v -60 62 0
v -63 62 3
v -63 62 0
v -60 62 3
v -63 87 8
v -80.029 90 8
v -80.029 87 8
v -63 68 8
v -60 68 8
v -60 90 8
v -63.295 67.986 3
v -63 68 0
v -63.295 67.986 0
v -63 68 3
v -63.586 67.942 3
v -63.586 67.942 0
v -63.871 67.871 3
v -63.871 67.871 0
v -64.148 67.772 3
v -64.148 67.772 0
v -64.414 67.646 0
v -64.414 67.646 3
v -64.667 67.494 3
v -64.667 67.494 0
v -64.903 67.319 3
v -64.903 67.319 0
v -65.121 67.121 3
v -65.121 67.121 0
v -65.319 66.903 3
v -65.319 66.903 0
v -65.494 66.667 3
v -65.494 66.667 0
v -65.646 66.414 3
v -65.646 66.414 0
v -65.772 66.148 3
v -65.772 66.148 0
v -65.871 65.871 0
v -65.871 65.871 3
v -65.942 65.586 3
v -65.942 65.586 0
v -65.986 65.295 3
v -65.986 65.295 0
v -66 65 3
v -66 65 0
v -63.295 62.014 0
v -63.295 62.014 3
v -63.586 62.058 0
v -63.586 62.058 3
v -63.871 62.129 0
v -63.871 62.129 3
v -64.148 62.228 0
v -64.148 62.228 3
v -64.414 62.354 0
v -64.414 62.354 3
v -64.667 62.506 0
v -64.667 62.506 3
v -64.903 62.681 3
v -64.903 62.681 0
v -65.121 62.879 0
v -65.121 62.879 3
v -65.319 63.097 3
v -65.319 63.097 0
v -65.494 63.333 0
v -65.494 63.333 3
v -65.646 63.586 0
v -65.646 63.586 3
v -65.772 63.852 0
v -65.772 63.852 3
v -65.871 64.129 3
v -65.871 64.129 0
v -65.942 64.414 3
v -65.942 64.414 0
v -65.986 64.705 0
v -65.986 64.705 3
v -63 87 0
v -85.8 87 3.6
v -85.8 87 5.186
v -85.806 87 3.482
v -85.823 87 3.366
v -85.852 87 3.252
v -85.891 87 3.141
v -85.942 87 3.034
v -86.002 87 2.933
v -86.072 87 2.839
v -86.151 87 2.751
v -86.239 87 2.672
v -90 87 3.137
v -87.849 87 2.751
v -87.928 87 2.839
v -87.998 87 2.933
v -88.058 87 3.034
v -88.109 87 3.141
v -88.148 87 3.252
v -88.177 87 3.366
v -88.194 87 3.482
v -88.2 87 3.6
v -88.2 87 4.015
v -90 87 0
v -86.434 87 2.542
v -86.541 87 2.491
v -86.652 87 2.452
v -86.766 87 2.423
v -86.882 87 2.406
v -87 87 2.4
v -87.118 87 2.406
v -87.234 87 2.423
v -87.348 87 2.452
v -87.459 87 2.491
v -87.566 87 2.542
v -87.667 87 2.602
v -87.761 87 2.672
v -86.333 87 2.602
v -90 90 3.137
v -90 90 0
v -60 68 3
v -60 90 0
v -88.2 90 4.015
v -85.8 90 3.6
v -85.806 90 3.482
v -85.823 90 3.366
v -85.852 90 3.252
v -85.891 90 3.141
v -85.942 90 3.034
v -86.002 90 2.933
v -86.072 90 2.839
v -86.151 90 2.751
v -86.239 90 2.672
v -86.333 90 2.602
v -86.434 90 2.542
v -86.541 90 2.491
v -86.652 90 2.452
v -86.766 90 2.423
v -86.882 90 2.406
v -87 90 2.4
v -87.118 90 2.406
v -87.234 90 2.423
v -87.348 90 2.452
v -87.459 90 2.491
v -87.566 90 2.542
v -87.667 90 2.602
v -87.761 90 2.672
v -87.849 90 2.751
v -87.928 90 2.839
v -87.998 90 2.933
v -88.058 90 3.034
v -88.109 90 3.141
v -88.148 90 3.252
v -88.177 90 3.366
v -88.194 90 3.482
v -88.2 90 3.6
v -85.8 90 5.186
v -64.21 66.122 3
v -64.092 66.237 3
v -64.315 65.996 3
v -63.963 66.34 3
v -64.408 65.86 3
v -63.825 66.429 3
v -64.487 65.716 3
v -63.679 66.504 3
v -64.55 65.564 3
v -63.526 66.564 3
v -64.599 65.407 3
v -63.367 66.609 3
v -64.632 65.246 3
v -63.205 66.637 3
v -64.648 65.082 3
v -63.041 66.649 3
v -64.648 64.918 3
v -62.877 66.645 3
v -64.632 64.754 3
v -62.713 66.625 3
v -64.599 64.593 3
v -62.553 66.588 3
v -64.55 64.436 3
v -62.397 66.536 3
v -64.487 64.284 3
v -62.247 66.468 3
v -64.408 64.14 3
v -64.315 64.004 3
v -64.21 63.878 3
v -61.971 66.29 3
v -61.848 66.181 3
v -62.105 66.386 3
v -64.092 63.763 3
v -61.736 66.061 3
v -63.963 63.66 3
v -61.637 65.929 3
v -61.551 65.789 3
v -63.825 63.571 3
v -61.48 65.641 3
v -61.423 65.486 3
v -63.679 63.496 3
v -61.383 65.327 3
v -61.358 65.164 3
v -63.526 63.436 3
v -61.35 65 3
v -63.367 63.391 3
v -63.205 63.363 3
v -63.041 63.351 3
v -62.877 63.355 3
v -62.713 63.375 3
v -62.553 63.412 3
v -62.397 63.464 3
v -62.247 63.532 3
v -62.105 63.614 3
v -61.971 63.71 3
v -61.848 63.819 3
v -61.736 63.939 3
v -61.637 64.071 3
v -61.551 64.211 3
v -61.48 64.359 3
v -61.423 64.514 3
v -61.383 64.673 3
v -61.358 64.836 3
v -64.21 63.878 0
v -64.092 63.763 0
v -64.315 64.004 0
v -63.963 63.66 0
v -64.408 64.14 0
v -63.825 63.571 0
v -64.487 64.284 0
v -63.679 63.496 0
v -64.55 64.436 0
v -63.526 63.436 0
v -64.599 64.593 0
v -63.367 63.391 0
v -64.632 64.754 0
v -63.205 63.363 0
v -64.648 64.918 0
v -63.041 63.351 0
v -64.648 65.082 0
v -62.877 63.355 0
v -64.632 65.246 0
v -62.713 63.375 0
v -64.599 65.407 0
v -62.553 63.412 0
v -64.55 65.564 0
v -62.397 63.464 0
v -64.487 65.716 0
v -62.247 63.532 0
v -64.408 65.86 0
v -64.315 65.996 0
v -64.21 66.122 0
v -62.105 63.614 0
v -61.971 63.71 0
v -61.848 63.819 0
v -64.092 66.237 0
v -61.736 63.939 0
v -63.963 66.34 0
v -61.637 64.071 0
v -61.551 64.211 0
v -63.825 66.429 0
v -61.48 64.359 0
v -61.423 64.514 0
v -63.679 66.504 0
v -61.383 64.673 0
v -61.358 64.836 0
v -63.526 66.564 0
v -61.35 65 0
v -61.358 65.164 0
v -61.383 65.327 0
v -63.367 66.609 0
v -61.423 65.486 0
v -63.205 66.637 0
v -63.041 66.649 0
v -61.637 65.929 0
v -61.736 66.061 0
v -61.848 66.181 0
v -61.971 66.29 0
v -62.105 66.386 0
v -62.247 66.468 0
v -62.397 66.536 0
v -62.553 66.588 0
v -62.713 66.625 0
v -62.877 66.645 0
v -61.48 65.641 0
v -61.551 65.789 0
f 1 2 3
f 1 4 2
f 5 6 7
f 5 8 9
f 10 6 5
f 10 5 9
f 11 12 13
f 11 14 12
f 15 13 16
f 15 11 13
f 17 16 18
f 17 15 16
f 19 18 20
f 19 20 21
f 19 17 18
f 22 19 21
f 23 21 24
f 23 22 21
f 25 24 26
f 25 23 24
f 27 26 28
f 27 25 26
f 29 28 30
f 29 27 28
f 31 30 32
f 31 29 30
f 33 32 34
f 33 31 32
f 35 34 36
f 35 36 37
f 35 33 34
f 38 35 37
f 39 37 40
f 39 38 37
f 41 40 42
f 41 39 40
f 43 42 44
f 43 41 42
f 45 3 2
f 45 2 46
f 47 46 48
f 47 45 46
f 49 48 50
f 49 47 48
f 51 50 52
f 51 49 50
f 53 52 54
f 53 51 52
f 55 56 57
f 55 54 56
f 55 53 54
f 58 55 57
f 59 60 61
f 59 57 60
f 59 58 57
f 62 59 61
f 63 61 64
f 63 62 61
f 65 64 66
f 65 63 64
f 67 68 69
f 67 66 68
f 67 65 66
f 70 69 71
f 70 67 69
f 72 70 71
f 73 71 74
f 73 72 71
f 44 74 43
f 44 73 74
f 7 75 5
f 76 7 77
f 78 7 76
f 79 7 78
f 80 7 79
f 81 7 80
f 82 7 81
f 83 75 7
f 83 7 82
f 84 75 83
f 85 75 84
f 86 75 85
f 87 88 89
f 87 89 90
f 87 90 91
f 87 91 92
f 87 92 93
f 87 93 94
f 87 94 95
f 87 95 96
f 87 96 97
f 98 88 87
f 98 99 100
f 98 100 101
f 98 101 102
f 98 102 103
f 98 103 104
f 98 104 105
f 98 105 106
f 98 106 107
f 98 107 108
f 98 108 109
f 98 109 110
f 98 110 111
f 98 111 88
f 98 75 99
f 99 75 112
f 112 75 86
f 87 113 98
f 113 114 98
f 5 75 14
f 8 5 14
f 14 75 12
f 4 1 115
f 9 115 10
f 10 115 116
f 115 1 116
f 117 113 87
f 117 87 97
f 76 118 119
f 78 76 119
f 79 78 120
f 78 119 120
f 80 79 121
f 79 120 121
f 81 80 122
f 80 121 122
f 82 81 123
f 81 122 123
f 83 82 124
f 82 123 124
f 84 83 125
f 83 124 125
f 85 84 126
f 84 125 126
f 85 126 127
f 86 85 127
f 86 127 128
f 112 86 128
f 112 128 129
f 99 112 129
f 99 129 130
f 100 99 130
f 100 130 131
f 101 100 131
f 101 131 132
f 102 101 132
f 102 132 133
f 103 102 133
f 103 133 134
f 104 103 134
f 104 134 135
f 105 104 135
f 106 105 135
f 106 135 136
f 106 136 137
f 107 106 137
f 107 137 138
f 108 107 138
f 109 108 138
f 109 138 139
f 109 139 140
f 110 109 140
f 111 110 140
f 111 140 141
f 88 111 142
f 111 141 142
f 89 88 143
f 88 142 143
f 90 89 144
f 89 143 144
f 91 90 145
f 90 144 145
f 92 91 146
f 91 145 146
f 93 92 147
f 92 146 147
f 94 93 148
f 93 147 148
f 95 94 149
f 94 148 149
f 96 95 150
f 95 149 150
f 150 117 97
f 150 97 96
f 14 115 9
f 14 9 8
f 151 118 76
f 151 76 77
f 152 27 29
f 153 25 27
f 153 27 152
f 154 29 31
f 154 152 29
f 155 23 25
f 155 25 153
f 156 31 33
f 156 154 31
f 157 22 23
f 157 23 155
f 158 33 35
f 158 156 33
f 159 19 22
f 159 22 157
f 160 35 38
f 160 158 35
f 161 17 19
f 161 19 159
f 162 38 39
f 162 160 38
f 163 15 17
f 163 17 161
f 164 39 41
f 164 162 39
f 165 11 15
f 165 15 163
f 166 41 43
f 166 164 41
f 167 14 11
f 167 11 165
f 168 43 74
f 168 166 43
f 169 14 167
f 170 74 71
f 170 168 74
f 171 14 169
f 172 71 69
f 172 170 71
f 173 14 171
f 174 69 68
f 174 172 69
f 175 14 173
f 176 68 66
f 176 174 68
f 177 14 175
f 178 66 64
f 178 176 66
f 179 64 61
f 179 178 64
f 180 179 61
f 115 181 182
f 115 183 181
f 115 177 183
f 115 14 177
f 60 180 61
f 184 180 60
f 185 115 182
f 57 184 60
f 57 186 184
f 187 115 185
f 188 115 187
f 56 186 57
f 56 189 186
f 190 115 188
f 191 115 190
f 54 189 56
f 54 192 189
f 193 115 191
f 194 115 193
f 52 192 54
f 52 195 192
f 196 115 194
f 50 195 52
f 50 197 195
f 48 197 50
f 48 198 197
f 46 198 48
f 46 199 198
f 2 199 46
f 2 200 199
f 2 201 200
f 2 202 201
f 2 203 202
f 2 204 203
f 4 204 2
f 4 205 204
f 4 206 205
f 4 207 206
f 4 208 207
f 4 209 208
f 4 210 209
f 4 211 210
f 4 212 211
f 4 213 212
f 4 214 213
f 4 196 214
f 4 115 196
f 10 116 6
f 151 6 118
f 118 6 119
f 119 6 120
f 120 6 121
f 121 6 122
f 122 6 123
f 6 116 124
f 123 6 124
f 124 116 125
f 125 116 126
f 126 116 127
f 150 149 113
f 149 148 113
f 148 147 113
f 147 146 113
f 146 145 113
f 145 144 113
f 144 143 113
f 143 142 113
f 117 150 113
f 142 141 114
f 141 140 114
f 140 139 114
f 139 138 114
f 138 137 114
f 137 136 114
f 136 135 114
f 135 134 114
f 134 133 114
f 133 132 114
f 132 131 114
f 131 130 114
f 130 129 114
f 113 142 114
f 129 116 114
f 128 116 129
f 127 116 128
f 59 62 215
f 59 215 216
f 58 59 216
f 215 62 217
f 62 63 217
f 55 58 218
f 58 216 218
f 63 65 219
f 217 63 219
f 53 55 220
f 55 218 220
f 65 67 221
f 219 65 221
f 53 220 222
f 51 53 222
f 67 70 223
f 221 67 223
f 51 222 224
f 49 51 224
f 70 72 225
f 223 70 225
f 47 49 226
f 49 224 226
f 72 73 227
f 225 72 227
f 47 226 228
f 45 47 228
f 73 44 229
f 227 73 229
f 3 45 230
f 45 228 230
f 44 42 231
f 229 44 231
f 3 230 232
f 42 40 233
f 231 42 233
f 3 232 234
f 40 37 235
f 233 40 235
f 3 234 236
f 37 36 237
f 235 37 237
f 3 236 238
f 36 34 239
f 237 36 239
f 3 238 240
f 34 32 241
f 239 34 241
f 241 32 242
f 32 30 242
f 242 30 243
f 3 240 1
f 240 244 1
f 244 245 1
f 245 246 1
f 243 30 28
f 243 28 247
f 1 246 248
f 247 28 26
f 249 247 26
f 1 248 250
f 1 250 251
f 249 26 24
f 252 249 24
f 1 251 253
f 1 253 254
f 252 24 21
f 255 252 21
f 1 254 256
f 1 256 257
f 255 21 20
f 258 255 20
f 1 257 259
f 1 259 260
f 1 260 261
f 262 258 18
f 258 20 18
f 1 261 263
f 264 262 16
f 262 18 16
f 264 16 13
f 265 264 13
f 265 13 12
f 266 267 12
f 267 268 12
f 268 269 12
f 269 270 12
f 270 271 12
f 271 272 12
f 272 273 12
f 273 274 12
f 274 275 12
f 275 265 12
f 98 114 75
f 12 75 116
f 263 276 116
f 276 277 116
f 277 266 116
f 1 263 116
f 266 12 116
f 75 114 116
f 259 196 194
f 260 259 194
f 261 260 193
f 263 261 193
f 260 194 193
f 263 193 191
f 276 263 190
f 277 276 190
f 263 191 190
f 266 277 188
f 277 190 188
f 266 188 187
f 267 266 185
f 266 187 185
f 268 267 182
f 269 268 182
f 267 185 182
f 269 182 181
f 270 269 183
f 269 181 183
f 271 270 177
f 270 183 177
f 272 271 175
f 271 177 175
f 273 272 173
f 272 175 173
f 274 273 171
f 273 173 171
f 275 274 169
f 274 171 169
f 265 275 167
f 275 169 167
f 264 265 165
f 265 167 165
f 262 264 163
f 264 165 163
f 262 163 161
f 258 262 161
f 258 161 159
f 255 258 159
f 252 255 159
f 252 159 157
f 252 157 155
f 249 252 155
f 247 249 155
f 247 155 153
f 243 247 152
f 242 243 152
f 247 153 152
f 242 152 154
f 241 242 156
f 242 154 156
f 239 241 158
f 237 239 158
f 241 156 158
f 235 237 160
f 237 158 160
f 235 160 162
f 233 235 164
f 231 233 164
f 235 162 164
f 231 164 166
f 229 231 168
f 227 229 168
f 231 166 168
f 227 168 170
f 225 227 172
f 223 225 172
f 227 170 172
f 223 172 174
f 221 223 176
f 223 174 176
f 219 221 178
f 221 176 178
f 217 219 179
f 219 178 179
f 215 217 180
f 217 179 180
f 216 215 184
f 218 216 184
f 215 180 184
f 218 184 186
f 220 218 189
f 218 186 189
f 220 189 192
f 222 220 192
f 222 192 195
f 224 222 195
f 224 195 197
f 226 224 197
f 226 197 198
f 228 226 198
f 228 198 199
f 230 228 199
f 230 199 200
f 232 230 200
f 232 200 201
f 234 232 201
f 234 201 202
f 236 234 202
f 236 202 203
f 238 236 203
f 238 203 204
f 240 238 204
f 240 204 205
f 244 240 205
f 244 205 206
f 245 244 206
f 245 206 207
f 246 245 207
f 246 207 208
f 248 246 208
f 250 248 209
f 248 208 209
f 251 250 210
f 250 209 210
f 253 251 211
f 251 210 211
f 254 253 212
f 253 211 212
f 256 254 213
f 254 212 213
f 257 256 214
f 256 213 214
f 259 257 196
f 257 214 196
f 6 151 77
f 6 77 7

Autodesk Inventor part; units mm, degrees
ref_plane "YZ Plane" through (0, 0, 0) normal (1, 0, 0) x (0, 1, 0)
ref_plane "XZ Plane" through (0, 0, 0) normal (0, 1, 0) x (-1, 0, 0)
ref_plane "XY Plane" through (0, 0, 0) normal (0, 0, 1) x (1, 0, 0)
sketch "Sketch1" plane through (0, 0, 0) normal (0, 0, 1) x (1, 0, 0)
  line L0 (-58, -60) -> (-60, -60) projected
  line L1 (-60, -60) -> (-60, -39.5) projected
  line L2 (-60, -39.5) -> (-58, -39.5) projected
  line L3 (-58, -39.5) -> (-58, -60) projected
  line L4 (49.6, 30) -> (51.6, 30) projected
  line L5 (51.6, 30) -> (51.6, 9.5) projected
  line L6 (51.6, 9.5) -> (49.6, 9.5) projected
  line L7 (49.6, 9.5) -> (49.6, 30) projected
  line L8 (-58, 39.5) -> (-60, 39.5) projected
  line L9 (-60, 39.5) -> (-60, 60) projected
  line L10 (-60, 60) -> (-58, 60) projected
  line L11 (-58, 60) -> (-58, 39.5) projected
  line L12 (-21.6, -39.5) -> (-19.6, -39.5) projected
  line L13 (-19.6, -39.5) -> (-19.6, -60) projected
  line L14 (-19.6, -60) -> (-21.6, -60) projected
  line L15 (-21.6, -60) -> (-21.6, -39.5) projected
  line L16 (51.6, -30) -> (49.6, -30) projected
  line L17 (49.6, -30) -> (49.6, -9.5) projected
  line L18 (49.6, -9.5) -> (51.6, -9.5) projected
  line L19 (51.6, -9.5) -> (51.6, -30) projected
  line L20 (-21.6, 60) -> (-19.6, 60) projected
  line L21 (-19.6, 60) -> (-19.6, 39.5) projected
  line L22 (-19.6, 39.5) -> (-21.6, 39.5) projected
  line L23 (-21.6, 39.5) -> (-21.6, 60) projected
  line L24 (90, -35) -> (90, 35) projected
  line L25 (90, 35) -> (49.6, 35) projected
  line L26 (49.6, 35) -> (49.6, 60) projected
  line L27 (49.6, 60) -> (90, 60) projected
  line L28 (90, 60) -> (90, 90) projected
  line L29 (90, 90) -> (-19.6, 90) projected
  line L30 (-19.6, 90) -> (-19.6, 65) projected
  line L31 (-19.6, 65) -> (-60, 65) projected
  line L32 (-60, 65) -> (-60, 90) projected
  line L33 (-60, 90) -> (-90, 90) projected
  line L34 (-90, 90) -> (-90, -90) projected
  line L35 (-90, -90) -> (-60, -90) projected
  line L36 (-60, -90) -> (-60, -65) projected
  line L37 (-60, -65) -> (-19.6, -65) projected
  line L38 (-19.6, -65) -> (-19.6, -90) projected
  line L39 (-19.6, -90) -> (90, -90) projected
  line L40 (90, -90) -> (90, -60) projected
  line L41 (90, -60) -> (49.6, -60) projected
  line L42 (49.6, -60) -> (49.6, -35) projected
  line L43 (49.6, -35) -> (90, -35) projected
  line L44 (86, -32) -> (73.8, -32) projected
  line L45 (73.8, -32) -> (73.8, -7.5) projected
  line L46 (73.8, -7.5) -> (86, -7.5) projected
  line L47 (86, -7.5) -> (86, -32) projected
  line L48 (65.8, -32) -> (53.6, -32) projected
  line L49 (53.6, -32) -> (53.6, -7.5) projected
  line L50 (53.6, -7.5) -> (65.8, -7.5) projected
  line L51 (65.8, -7.5) -> (65.8, -32) projected
  line L52 (86, -86) -> (70.6, -86) projected
  line L53 (70.6, -86) -> (70.6, -69.8) projected
  line L54 (70.6, -69.8) -> (86, -69.8) projected
  line L55 (86, -69.8) -> (86, -86) projected
  line L56 (86, 86) -> (86, 69.8) projected
  line L57 (86, 69.8) -> (70.6, 69.8) projected
  line L58 (70.6, 69.8) -> (70.6, 86) projected
  line L59 (70.6, 86) -> (86, 86) projected
  line L60 (73.8, 32) -> (86, 32) projected
  line L61 (86, 32) -> (86, 7.5) projected
  line L62 (86, 7.5) -> (73.8, 7.5) projected
  line L63 (73.8, 7.5) -> (73.8, 32) projected
  line L64 (65.8, 32) -> (65.8, 7.5) projected
  line L65 (65.8, 7.5) -> (53.6, 7.5) projected
  line L66 (53.6, 7.5) -> (53.6, 32) projected
  line L67 (53.6, 32) -> (65.8, 32) projected
  line L68 (-69.6, -87) -> (-85, -87) projected
  line L69 (-85, -87) -> (-85, -70.8) projected
  line L70 (-85, -70.8) -> (-69.6, -70.8) projected
  line L71 (-69.6, -70.8) -> (-69.6, -87) projected
  line L72 (-56, -62) -> (-56, -37.5) projected
  line L73 (-56, -37.5) -> (-43.8, -37.5) projected
  line L74 (-43.8, -37.5) -> (-43.8, -62) projected
  line L75 (-43.8, -62) -> (-56, -62) projected
  line L76 (-56, 62) -> (-43.8, 62) projected
  line L77 (-43.8, 62) -> (-43.8, 37.5) projected
  line L78 (-43.8, 37.5) -> (-56, 37.5) projected
  line L79 (-56, 37.5) -> (-56, 62) projected
  line L80 (-23.6, 62) -> (-23.6, 37.5) projected
  line L81 (-23.6, 37.5) -> (-35.8, 37.5) projected
  line L82 (-35.8, 37.5) -> (-35.8, 62) projected
  line L83 (-35.8, 62) -> (-23.6, 62) projected
  line L84 (-23.6, -62) -> (-35.8, -62) projected
  line L85 (-35.8, -62) -> (-35.8, -37.5) projected
  line L86 (-35.8, -37.5) -> (-23.6, -37.5) projected
  line L87 (-23.6, -37.5) -> (-23.6, -62) projected
  line L88 (-85, 87) -> (-69.6, 87) projected
  line L89 (-69.6, 87) -> (-69.6, 70.8) projected
  line L90 (-69.6, 70.8) -> (-85, 70.8) projected
  line L91 (-85, 70.8) -> (-85, 87) projected
  line L92 (-90, 90) -> (-60, 90)
  line L93 (-60, 90) -> (-60, 87)
  line L94 (-60, 87) -> (-90, 87)
  line L95 (-90, 87) -> (-90, 90)
  line L96 (-90, 90) -> (-60, 90)
  line L97 (-60, 90) -> (-60, 87)
  line L98 (-60, 87) -> (-90, 87)
  line L99 (-90, 87) -> (-90, 90)
  line L100 (-19.6, 65) -> (-60, 65) projected
  line L101 (-60, 65) -> (-60, 68) projected
  line L102 (-60, 68) -> (-63, 68) projected
  line L103 (-63, 62) -> (-16.6, 62) projected
  line L104 (-19.6, 68) -> (-19.6, 65) projected
  line L105 (-60, 87) -> (-63, 87)
  line L106 (-63, 87) -> (-63, 68)
  line L107 (-63, 68) -> (-60, 68)
  line L108 (-60, 68) -> (-60, 87)
  circle A0 centre (-63, -65) radius 1.5 projected
  circle A1 centre (-16.6, -87) radius 1.5 projected
  circle A2 centre (49.6, -87) radius 1.5 projected
  circle A3 centre (46.6, -60) radius 1.5 projected
  circle A4 centre (87, -63) radius 1.5 projected
  circle A5 centre (46.6, -32) radius 1.5 projected
  circle A6 centre (46.6, 32) radius 1.5 projected
  circle A7 centre (87, 63) radius 1.5 projected
  circle A8 centre (46.6, 60) radius 1.5 projected
  circle A9 centre (49.6, 87) radius 1.5 projected
  circle A10 centre (-16.6, 87) radius 1.5 projected
  circle A11 centre (-16.6, 65) radius 1.5 projected
  circle A12 centre (-63, 65) radius 1.5 projected
  arc A13 (-63, 68) -> (-63, 62) centre (-63, 65) ccw projected
  arc A14 (-16.6, 62) -> (-16.6, 68) centre (-16.6, 65) ccw projected
  line L109 (-16.6, 68) -> (-19.6, 68) projected
  line L110 (-76, -39.25) -> (-82, -39.25) projected
  line L111 (-82, -39.25) -> (-82, -20.75) projected
  line L112 (-82, -20.75) -> (-76, -20.75) projected
  line L113 (-76, -20.75) -> (-76, -39.25) projected
  line L114 (-76, 20.75) -> (-82, 20.75) projected
  line L115 (-82, 20.75) -> (-82, 39.25) projected
  line L116 (-82, 39.25) -> (-76, 39.25) projected
  line L117 (-76, 39.25) -> (-76, 20.75) projected
  circle A15 centre (-87, 55.8) radius 1.25 projected
  circle A16 centre (-87, -55.8) radius 1.25 projected
  point P0 (0, 0)
extrude "Extrusion1" add sketch "Sketch1" along normal blind 8 contours L102 L106 L94 L32 | L34 L33 L32 L94 L88
sketch "Sketch2" plane through (-63, 68, 0) normal (-1, 0, 0) x (0, 0, 1)
  line L0 (0, 0) -> (3, 0)
  line L1 (3, 0) -> (3, -6)
  line L2 (3, -6) -> (0, -6)
  line L3 (0, -6) -> (0, 0)
  point P0 (0, -68)
  dimension "d2" = 3
  dimension "d3" = 6
extrude "Extrusion2" add sketch "Sketch2" along normal mid plane 6
sketch "Sketch3" plane through (-66, 62, 3) normal (0, 0, 1) x (1, 0, 0)
  circle A0 centre (3, 3) radius 2 projected
  circle A1 centre (3, 3) radius 1.65
  point P0 (66, -62)
  dimension "d6" = 3.3
extrude "Extrusion3" cut sketch "Sketch3" against normal blind 3 contours A1
sketch "Sketch4" plane through (-90, 90, 0) normal (0, 1, 0) x (1, 0, 0)
  line L0 (0, 0) -> (27, 0) projected
  line L1 (0, 0) -> (0, -3.137)
  line L2 (0, 0) -> (0, -8) projected
  line L3 (0, -3.137) -> (9.9706, -8)
  line L4 (0, -3.137) -> (11.0933, -3.137) construction
  line L5 (30, -8) -> (0, -8) projected
  point P0 (90, 0)
  dimension "d9" = 3.137
  dimension "d10" = 26
extrude "Extrusion4" cut sketch "Sketch4" against normal blind 3
fillet "Fillet1" radius 3 2 edges at (-66, 62, 1.5) (-66, 68, 1.5)
sketch "Sketch5" plane through (-90, 90, 0) normal (0, 1, 0) x (1, 0, 0)
  circle A0 centre (3, -3.6) radius 1.2 projected
  line L0 (4.2, -4.8) -> (1.8, -4.8)
  line L1 (1.8, -4.8) -> (1.8, -2.4)
  line L2 (1.8, -2.4) -> (4.2, -2.4)
  line L3 (4.2, -2.4) -> (4.2, -4.8)
  line L4 (4.2, -4.8) -> (1.8, -2.4) construction
  line L5 (1.8, -4.8) -> (4.2, -2.4) construction
  line L6 (4.2, -4.8) -> (4.2, -5.1855)
  line L7 (9.9706, -8) -> (0, -3.137) projected
  line L8 (4.2, -5.1855) -> (3.3204, -4.7564)
  point P0 (90, 0)
  point P1 (4.2, -3.6)
  point P2 (3, -2.4)
  point P3 (3, -4.8)
  point P4 (1.8, -3.6)
  point P5 (3.4097, -4.8)
  point P6 (1.8, -4.0149)
extrude "Extrusion5" cut sketch "Sketch5" against normal blind 3 contours L7 A0 | A0 L3 L0 L7 | L0 L6 L7 | L7 L1 A0 picked at (3.1852, -3.7592)
properties part number "leftfrontwall"
